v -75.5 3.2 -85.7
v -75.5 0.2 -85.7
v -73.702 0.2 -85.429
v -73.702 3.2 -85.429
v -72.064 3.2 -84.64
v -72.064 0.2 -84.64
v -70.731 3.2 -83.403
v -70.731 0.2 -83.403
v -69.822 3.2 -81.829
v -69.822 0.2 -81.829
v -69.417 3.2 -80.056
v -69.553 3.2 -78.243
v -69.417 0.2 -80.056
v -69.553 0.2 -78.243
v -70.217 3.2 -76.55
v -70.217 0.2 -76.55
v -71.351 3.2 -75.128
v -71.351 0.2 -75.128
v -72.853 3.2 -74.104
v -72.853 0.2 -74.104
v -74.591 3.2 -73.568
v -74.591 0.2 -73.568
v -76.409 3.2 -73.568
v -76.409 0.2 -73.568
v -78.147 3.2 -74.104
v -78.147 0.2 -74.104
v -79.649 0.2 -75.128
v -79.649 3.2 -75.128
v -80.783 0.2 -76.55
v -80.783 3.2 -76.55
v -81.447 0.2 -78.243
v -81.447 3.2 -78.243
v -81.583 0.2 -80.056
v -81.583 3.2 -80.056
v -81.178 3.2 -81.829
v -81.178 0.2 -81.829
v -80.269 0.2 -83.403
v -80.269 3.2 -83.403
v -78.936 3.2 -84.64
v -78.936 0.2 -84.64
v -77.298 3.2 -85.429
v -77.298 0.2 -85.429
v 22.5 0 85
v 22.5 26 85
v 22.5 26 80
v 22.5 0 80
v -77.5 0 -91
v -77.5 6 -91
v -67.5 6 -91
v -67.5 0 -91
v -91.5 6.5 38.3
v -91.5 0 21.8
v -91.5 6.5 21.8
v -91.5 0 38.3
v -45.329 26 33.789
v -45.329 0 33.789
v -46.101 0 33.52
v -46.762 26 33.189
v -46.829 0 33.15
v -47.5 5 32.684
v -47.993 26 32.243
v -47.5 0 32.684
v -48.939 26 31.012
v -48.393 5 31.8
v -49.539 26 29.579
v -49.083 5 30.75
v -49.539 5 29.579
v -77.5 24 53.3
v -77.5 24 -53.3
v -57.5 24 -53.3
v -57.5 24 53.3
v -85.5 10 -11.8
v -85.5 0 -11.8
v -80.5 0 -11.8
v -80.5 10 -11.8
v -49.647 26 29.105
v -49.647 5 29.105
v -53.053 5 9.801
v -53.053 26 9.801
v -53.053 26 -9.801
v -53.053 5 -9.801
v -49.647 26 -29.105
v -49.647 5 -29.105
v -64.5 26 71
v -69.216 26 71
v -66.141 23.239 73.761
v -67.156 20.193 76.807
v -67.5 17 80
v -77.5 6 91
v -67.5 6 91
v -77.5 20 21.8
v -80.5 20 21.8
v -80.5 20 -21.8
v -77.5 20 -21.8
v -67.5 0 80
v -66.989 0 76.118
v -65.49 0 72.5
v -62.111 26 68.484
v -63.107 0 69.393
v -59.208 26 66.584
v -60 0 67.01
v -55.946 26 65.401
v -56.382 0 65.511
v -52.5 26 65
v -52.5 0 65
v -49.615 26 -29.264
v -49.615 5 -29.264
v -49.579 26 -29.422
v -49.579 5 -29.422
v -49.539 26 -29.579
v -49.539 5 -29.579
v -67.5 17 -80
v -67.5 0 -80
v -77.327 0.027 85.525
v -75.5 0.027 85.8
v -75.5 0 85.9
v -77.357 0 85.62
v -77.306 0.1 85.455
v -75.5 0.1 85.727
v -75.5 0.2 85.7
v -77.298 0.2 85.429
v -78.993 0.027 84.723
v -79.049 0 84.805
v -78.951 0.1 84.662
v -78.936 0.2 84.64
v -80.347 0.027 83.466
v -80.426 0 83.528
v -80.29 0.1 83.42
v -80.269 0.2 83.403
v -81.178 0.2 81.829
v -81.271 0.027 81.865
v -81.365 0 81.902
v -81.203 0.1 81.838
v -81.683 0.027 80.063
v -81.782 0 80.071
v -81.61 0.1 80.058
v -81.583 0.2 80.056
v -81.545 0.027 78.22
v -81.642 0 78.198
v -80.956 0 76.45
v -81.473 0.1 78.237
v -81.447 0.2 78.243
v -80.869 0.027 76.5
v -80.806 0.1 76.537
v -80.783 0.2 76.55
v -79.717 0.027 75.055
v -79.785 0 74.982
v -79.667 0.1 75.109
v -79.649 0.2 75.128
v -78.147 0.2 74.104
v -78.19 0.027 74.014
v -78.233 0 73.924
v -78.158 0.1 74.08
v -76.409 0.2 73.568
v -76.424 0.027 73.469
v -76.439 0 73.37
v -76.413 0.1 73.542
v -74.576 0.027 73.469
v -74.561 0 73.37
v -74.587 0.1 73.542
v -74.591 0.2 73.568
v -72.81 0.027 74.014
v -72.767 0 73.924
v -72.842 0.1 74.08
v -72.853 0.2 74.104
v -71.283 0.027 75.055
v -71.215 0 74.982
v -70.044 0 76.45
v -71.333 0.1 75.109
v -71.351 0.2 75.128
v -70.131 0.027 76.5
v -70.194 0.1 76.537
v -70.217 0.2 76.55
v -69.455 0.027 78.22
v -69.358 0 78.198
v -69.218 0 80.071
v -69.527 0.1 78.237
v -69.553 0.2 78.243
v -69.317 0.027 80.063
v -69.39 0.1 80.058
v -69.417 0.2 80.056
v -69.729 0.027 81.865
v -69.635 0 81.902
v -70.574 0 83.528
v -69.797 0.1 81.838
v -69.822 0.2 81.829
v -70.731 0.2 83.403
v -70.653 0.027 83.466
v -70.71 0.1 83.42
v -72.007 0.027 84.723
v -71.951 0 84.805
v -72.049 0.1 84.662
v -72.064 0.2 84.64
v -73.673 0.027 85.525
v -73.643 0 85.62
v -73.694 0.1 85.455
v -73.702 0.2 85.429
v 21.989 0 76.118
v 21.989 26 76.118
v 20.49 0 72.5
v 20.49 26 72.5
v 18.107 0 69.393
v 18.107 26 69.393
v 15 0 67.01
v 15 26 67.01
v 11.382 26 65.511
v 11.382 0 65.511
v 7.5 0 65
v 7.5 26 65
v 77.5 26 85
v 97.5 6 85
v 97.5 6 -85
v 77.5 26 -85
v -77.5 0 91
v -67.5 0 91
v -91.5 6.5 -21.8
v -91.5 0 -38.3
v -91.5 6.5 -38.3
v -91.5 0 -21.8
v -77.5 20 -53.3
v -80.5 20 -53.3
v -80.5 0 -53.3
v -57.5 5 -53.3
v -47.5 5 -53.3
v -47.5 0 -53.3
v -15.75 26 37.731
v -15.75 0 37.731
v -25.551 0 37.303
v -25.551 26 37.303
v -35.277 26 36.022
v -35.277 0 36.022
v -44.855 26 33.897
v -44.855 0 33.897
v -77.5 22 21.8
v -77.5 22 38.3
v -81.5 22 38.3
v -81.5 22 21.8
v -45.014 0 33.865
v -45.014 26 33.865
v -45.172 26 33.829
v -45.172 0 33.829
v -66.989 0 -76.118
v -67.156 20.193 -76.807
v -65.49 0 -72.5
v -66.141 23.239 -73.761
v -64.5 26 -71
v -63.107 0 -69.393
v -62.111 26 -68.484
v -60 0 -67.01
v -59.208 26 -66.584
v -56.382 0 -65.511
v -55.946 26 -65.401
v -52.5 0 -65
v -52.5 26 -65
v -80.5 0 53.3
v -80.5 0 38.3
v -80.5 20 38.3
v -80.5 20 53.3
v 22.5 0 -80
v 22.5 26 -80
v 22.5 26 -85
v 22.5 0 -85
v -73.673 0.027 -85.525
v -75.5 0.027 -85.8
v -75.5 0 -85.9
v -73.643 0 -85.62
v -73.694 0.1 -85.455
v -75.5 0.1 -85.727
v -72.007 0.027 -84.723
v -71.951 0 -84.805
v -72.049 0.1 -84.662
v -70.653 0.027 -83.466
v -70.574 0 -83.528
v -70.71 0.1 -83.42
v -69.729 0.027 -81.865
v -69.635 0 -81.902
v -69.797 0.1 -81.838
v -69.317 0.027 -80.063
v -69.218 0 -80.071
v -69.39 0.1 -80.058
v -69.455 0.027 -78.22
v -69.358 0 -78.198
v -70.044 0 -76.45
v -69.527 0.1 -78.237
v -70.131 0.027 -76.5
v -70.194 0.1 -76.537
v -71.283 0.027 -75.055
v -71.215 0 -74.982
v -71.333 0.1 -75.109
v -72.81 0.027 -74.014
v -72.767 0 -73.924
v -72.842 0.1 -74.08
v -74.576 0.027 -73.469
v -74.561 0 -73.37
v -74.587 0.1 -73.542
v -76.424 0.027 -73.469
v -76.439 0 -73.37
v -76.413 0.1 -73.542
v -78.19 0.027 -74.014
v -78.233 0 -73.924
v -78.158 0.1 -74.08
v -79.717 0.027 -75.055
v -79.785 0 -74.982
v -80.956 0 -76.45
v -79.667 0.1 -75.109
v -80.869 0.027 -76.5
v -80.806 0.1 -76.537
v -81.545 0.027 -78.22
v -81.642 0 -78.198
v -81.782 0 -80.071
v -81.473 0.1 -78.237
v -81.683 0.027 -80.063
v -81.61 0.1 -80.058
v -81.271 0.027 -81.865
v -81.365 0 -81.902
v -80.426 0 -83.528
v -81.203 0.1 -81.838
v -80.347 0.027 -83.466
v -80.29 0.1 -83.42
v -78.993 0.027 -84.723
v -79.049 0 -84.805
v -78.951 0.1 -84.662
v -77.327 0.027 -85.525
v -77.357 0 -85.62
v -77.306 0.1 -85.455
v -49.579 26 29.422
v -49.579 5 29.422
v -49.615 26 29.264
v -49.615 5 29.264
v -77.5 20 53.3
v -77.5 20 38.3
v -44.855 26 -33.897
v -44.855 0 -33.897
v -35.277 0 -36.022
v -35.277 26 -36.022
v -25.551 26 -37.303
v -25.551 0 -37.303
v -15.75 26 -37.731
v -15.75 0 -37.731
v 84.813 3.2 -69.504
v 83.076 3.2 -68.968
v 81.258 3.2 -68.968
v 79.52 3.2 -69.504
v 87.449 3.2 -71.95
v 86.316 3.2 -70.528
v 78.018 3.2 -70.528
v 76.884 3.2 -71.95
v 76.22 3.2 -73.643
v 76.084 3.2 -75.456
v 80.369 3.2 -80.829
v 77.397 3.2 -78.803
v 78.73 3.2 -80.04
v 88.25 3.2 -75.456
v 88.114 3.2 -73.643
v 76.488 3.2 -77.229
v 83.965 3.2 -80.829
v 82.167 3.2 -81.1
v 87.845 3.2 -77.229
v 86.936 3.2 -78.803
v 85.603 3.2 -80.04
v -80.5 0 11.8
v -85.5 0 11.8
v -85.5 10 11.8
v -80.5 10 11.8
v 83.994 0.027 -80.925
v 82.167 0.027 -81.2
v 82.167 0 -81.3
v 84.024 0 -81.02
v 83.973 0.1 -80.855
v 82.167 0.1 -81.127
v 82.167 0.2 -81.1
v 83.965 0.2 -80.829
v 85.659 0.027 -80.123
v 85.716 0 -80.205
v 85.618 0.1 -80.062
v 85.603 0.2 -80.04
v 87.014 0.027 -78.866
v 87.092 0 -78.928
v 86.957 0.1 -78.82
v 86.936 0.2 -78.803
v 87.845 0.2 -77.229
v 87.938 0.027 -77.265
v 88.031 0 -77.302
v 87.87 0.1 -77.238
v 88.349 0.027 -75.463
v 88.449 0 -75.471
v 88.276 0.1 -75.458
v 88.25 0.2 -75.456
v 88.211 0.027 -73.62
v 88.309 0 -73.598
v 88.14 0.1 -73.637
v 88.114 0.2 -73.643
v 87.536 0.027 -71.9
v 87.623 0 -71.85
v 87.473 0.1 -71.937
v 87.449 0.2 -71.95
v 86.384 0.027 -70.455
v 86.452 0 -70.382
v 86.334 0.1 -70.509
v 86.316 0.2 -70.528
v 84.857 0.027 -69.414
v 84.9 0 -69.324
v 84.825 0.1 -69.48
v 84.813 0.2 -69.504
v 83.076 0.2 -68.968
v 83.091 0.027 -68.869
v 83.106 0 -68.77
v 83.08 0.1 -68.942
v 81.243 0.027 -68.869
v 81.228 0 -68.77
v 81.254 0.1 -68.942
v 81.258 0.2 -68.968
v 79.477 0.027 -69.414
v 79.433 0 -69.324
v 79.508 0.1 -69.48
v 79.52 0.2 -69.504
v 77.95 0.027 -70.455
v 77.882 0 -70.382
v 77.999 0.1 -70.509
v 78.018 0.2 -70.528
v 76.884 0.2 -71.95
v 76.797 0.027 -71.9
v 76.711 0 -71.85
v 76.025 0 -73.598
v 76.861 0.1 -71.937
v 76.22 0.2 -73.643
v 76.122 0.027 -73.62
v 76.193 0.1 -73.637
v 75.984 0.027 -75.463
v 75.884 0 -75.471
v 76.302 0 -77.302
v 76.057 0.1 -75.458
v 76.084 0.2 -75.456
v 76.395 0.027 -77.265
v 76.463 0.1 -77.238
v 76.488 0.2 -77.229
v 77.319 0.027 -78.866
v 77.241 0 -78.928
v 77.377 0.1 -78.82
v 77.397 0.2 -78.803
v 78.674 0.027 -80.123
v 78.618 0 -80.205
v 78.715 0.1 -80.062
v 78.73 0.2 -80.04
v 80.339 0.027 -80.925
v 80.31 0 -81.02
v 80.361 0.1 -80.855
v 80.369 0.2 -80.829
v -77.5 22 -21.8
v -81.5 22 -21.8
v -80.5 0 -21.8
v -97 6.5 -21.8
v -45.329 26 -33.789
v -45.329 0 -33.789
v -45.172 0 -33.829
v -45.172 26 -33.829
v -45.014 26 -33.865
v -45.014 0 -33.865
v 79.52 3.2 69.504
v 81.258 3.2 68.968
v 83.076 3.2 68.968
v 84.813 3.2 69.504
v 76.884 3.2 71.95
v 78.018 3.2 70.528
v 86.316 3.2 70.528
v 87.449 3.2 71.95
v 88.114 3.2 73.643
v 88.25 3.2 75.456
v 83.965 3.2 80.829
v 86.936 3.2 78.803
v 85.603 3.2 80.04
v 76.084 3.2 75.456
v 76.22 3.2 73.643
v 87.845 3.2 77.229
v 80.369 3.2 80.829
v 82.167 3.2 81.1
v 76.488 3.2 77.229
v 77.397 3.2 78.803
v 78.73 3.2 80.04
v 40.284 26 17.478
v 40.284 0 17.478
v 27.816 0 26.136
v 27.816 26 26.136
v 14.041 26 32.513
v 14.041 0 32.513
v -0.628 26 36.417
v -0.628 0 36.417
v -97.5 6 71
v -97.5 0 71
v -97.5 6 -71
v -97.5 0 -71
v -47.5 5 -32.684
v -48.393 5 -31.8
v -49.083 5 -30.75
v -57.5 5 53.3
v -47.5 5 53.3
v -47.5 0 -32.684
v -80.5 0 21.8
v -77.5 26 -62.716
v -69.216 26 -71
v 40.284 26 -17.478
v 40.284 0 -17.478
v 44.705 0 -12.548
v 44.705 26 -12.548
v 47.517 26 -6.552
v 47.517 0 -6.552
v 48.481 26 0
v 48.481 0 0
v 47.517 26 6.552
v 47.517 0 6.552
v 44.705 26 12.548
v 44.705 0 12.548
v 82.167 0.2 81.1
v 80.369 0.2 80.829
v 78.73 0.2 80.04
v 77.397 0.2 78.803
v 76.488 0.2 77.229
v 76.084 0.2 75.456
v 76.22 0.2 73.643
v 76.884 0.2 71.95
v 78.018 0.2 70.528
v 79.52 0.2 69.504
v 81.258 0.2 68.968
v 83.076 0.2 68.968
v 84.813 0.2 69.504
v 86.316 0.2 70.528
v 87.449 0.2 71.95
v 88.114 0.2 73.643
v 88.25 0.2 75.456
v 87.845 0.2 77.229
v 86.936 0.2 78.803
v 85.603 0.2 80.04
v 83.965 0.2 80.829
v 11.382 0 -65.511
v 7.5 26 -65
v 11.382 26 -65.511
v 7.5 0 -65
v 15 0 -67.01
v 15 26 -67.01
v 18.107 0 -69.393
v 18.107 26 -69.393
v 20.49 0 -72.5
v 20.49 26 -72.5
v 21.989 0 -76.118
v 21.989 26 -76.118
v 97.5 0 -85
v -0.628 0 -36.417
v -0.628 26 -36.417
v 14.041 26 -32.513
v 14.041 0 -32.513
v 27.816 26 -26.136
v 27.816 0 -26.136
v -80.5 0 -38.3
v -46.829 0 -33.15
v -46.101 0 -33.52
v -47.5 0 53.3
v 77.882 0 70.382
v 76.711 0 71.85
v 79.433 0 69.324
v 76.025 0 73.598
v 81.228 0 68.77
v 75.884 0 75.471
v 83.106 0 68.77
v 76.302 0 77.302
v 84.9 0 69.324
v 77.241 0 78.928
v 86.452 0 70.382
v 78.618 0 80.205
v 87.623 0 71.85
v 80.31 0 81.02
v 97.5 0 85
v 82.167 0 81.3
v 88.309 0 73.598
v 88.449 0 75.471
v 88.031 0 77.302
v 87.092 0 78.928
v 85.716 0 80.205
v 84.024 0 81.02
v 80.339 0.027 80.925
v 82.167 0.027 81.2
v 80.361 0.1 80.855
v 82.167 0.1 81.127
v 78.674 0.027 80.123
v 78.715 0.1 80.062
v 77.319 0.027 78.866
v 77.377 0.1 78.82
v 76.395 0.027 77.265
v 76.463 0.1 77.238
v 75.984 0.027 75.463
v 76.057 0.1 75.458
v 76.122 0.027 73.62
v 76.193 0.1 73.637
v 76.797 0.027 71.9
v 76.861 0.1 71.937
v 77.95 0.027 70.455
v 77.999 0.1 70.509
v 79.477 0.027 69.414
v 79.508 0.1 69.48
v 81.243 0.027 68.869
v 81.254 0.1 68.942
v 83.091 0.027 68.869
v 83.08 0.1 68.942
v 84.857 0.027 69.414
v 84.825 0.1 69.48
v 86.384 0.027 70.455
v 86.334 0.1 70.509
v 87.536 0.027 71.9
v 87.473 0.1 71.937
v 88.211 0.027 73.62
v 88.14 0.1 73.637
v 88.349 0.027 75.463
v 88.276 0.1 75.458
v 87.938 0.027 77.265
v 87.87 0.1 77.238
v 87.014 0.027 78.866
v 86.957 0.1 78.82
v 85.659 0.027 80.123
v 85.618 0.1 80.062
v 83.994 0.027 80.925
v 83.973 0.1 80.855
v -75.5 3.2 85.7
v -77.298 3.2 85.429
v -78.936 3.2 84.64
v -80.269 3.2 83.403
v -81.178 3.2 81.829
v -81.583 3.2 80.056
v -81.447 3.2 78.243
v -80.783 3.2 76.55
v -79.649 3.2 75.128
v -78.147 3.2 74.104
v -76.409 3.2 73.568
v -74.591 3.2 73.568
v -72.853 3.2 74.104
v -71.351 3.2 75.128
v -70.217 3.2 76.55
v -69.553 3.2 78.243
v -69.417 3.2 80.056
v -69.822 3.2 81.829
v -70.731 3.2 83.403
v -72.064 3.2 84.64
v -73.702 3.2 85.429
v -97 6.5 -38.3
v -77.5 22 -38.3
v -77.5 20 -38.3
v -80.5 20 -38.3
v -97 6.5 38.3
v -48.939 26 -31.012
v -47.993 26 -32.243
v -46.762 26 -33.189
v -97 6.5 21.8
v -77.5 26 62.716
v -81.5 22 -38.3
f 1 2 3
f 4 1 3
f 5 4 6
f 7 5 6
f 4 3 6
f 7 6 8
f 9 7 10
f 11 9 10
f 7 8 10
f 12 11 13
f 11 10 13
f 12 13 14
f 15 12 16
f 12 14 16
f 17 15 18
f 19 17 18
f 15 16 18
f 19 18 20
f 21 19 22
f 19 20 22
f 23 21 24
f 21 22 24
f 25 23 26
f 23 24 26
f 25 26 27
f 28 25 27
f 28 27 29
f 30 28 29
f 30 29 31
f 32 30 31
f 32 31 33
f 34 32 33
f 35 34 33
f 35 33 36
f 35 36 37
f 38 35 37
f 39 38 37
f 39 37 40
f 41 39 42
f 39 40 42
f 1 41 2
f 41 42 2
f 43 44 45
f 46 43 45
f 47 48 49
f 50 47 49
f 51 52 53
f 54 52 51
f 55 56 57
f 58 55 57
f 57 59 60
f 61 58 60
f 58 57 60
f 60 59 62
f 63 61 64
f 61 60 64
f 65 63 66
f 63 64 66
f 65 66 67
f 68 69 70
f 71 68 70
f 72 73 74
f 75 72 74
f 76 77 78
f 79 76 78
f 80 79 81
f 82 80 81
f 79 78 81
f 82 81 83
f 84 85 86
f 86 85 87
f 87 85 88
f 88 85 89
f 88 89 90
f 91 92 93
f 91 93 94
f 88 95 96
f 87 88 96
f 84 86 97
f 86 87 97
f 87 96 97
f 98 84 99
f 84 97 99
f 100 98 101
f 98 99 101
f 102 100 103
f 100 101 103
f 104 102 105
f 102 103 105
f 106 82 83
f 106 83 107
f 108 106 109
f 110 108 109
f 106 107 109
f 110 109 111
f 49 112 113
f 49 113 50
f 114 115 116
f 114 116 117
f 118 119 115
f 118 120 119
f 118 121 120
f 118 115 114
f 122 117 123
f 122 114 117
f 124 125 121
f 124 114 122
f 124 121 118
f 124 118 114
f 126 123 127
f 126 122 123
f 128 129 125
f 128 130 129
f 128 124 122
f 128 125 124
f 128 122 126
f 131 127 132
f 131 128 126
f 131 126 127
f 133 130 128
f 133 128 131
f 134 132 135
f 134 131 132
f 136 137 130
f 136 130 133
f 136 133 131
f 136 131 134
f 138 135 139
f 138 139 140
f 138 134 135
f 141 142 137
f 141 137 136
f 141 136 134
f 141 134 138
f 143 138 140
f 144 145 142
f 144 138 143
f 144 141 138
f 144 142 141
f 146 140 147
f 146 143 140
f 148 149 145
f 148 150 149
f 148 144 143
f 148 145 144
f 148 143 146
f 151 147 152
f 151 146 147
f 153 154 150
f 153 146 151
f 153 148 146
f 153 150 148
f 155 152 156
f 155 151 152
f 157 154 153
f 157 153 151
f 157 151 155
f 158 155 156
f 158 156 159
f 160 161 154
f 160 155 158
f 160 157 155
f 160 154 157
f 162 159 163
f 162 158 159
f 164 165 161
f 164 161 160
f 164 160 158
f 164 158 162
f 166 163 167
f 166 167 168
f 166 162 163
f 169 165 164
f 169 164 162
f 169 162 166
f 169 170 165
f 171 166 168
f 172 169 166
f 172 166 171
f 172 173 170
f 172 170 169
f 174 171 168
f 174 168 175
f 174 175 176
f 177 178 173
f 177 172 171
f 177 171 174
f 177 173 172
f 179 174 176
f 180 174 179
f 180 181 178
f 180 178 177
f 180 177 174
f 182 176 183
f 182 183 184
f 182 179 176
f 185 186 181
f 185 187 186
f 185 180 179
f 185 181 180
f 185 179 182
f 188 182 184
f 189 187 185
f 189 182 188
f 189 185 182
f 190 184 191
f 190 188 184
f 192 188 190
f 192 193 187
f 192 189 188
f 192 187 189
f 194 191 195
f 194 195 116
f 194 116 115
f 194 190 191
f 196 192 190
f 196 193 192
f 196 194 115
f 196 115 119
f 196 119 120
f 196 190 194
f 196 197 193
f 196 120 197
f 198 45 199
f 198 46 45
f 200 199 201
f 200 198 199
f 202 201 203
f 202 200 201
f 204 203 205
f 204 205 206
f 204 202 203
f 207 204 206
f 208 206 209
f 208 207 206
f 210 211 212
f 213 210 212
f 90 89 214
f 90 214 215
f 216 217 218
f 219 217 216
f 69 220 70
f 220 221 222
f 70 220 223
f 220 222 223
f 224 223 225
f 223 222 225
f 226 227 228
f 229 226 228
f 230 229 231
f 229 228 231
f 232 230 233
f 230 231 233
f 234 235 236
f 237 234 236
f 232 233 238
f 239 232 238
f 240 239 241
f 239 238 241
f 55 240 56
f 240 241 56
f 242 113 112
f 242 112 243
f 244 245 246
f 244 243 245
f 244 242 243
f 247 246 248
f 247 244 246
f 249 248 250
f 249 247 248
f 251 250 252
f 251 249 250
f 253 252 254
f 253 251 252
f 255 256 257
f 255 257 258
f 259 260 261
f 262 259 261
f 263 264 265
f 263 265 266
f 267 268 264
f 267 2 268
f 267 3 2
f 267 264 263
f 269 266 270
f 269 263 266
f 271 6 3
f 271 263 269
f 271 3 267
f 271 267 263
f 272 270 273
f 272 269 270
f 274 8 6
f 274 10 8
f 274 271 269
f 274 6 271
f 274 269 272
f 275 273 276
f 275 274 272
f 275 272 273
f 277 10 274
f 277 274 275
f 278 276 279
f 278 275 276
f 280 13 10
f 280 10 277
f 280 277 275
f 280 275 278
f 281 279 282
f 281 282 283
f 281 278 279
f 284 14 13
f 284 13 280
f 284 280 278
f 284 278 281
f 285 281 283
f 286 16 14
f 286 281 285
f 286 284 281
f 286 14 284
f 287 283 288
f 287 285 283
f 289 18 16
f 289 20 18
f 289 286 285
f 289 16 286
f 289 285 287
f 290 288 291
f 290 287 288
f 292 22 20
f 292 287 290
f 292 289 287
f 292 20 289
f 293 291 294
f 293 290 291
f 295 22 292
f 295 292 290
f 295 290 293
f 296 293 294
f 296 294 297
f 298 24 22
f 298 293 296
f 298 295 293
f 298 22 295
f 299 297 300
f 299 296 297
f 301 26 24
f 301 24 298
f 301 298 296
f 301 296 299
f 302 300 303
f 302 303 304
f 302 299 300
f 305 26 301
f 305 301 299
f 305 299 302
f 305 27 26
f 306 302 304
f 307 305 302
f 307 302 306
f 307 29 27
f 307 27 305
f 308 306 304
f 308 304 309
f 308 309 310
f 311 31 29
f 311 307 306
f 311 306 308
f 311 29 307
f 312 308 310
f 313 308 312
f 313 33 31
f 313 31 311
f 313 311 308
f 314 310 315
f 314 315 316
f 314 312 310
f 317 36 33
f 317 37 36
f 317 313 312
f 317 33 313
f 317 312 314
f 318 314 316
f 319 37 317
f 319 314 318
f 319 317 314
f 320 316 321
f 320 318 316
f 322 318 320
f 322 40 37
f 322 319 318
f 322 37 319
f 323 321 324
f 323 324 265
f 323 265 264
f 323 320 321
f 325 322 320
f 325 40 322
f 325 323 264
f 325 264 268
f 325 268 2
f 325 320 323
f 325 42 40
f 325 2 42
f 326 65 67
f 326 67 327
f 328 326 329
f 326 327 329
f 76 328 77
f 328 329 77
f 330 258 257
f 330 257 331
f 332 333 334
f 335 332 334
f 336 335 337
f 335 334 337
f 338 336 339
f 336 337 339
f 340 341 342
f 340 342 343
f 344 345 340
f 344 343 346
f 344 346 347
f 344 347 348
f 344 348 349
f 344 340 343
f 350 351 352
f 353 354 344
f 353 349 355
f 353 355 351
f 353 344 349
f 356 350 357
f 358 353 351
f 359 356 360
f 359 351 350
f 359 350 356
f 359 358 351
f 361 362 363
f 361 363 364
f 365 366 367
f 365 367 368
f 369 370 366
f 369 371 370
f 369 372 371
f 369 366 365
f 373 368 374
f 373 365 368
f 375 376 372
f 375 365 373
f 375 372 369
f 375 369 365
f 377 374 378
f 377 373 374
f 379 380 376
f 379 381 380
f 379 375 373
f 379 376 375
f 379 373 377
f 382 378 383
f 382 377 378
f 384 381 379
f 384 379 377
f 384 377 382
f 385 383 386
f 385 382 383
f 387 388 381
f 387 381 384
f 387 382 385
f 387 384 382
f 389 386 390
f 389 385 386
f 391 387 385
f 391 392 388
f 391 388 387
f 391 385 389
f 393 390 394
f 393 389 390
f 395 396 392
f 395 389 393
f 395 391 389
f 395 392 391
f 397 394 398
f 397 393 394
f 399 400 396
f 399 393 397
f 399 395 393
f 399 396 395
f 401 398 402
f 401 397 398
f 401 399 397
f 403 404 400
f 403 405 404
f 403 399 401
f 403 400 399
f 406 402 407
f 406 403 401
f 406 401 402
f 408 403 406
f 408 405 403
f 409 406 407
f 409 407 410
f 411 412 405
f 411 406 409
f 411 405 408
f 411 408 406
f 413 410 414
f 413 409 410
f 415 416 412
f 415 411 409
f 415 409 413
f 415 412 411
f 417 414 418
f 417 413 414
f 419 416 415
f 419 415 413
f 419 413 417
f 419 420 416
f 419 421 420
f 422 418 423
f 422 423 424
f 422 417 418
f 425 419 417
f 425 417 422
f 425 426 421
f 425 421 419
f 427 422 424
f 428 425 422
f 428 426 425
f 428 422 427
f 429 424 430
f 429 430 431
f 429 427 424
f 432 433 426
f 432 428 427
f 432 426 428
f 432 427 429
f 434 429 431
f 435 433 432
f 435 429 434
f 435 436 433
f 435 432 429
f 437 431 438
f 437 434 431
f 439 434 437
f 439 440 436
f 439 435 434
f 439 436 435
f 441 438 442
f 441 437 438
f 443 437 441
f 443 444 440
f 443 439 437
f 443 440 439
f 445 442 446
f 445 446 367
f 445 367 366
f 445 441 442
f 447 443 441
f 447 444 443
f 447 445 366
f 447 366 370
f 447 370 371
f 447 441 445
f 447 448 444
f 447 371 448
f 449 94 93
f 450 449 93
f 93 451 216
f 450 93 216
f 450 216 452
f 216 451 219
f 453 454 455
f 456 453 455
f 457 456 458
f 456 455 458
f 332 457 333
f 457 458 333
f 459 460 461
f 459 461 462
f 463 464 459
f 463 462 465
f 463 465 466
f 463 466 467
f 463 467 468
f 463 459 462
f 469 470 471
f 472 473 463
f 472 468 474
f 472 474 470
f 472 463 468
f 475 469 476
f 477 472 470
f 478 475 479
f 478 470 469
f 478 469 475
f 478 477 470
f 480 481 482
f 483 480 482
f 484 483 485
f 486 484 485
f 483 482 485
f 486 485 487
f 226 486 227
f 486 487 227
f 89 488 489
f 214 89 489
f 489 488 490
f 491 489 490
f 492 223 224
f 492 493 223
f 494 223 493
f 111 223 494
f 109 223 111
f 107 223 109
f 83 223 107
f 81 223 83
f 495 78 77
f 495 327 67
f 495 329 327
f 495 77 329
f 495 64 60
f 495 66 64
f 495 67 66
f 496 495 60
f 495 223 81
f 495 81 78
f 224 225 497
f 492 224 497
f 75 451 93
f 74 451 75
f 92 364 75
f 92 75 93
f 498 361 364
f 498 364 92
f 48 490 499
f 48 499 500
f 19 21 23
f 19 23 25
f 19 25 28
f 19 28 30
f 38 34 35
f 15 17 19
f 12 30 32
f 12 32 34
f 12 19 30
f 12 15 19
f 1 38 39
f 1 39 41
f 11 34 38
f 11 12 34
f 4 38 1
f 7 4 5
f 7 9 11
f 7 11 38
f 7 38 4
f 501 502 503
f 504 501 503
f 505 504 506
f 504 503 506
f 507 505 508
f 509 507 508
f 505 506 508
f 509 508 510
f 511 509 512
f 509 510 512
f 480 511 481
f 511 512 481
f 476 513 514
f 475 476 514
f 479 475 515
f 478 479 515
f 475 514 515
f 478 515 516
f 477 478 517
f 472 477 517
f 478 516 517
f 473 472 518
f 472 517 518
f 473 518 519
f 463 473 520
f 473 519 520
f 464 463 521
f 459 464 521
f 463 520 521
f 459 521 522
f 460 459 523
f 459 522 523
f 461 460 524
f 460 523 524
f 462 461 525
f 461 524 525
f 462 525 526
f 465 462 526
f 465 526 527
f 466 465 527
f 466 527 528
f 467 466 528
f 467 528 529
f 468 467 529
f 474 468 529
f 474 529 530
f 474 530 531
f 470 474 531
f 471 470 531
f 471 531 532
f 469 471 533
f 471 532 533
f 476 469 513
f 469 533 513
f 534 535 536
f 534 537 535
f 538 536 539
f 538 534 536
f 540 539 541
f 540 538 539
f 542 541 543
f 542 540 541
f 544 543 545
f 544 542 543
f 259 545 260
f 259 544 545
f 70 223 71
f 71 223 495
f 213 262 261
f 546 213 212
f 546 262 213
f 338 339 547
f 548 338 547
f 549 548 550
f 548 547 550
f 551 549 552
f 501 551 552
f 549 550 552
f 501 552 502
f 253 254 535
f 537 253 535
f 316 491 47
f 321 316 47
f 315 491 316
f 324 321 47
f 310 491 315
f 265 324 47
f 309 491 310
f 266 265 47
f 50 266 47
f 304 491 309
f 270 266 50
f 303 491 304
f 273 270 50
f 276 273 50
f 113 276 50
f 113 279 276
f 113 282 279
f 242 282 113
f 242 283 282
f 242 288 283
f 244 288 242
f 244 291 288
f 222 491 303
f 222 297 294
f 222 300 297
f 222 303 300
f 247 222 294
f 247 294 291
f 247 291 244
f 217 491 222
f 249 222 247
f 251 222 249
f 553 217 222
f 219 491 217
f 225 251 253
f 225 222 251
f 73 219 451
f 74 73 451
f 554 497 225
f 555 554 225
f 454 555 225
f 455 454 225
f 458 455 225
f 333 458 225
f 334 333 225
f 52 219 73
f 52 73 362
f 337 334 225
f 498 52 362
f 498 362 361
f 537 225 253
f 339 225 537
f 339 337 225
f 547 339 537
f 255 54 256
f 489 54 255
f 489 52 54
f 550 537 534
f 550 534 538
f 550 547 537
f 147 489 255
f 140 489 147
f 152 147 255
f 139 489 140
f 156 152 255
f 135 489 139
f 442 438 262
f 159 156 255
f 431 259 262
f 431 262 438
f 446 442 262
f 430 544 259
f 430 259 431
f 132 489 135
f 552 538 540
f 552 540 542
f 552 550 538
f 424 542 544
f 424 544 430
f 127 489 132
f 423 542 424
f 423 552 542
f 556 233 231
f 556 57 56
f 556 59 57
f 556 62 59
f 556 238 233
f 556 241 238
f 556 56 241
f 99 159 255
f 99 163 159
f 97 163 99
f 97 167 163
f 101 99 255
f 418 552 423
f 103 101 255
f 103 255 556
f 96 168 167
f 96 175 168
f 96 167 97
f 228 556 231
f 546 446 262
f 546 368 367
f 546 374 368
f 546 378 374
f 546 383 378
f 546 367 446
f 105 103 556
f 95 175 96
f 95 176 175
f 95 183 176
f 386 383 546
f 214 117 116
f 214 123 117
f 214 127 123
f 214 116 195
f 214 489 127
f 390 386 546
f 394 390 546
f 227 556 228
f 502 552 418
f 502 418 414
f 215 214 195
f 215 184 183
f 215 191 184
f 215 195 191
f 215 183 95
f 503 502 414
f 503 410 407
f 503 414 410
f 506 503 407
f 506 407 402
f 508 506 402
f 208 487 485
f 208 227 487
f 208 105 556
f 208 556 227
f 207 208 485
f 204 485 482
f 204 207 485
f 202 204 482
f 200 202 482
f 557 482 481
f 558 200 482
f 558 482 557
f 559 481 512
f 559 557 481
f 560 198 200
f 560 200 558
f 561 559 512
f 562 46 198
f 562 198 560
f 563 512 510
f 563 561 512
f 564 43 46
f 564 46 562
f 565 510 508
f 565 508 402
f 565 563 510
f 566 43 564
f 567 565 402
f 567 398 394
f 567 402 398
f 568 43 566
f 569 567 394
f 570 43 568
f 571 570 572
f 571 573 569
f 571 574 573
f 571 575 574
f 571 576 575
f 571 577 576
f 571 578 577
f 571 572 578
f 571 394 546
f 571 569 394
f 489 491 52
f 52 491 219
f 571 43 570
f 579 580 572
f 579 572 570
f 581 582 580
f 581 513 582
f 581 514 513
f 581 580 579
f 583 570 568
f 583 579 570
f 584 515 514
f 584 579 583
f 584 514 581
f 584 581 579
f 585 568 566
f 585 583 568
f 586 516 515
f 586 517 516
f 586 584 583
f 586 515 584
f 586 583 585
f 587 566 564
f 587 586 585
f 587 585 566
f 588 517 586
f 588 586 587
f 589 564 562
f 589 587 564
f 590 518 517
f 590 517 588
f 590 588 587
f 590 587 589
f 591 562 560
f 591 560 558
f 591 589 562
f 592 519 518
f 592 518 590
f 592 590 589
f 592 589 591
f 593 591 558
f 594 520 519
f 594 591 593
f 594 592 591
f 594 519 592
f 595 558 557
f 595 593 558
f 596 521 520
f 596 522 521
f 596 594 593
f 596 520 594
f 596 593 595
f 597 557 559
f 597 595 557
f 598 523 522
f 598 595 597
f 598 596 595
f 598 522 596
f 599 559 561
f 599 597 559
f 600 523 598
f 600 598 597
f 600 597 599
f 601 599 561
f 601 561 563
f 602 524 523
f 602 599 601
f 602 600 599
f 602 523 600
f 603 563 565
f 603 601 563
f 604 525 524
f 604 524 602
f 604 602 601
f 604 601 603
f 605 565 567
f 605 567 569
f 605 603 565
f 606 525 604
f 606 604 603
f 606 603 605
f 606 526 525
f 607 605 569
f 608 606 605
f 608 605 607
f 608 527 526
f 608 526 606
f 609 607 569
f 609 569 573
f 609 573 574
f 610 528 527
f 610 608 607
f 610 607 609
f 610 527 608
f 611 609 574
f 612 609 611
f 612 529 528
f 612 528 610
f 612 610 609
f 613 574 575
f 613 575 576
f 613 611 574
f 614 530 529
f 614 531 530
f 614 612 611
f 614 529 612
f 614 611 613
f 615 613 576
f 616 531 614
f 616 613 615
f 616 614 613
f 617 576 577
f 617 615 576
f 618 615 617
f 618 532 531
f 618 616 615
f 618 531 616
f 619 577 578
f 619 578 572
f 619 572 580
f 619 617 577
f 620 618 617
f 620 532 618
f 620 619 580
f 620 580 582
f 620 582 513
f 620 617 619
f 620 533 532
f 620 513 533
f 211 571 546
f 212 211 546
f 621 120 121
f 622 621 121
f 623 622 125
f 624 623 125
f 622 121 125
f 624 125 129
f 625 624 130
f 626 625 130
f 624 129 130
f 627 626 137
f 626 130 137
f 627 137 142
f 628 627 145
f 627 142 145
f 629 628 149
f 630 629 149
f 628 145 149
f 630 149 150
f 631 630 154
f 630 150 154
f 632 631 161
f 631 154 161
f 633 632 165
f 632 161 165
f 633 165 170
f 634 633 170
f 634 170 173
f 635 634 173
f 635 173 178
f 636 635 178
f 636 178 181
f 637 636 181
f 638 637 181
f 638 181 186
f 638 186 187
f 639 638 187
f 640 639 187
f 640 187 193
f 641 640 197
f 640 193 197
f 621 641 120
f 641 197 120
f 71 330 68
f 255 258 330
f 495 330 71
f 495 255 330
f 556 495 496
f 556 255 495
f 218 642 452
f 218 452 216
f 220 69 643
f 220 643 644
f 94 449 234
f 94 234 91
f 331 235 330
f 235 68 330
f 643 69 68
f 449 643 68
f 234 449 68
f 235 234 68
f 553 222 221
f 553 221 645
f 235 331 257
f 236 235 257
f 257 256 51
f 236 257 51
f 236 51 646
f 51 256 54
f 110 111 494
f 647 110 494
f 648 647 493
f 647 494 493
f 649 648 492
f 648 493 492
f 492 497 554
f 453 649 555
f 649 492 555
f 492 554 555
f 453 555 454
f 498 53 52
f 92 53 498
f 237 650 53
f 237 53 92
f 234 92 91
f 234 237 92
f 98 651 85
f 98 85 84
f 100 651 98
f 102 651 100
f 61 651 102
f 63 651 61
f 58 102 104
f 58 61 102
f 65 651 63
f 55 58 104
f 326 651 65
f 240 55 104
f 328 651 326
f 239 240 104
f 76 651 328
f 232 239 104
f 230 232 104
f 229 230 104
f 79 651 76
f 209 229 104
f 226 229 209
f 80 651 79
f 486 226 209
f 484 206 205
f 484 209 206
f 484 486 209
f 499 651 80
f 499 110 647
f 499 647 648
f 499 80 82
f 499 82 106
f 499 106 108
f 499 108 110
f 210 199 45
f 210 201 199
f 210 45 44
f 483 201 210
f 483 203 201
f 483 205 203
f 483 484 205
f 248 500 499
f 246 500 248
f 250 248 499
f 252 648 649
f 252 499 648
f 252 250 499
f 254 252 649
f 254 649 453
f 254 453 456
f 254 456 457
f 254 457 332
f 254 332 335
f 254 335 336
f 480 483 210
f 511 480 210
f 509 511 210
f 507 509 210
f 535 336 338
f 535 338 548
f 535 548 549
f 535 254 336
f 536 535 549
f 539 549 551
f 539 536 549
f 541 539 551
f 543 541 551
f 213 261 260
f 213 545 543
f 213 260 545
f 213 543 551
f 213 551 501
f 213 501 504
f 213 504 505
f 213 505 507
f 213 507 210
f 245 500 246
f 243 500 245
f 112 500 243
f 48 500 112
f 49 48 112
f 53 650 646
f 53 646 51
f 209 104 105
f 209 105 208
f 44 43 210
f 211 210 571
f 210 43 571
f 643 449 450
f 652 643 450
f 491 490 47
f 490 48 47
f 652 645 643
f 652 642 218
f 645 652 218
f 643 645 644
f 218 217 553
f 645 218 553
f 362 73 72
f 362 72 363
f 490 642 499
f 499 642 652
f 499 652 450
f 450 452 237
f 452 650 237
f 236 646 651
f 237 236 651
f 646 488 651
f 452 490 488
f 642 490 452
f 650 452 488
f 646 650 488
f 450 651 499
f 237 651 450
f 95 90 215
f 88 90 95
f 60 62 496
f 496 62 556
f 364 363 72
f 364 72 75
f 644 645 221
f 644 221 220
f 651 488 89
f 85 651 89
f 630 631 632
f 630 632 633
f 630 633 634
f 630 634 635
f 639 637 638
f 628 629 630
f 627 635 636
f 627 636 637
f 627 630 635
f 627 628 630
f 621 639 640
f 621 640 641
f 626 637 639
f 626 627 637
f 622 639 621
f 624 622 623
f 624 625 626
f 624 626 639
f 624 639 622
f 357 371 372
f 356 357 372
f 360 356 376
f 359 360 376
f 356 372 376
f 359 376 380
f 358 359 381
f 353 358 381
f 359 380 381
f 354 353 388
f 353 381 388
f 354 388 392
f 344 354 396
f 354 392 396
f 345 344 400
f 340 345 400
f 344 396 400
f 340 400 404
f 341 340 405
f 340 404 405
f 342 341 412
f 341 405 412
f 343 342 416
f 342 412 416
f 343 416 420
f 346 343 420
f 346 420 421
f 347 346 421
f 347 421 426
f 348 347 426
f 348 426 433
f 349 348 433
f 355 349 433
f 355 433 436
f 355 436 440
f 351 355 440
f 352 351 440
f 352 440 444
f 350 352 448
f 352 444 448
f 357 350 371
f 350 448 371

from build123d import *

# Parameters (mm, degrees)
SKETCH1_W           = 195
SKETCH1_H           = 170
BOSS_EXTRUDE1_DEPTH = 26
SKETCH2_W           = 90
SKETCH2_H           = 20
CUT_EXTRUDE1_DEPTH  = 132.936537775
FILLET1_R           = 15
SKETCH3_W           = 30
SKETCH3_H           = 6
BOSS_EXTRUDE2_DEPTH = 26
CHAMFER1_SIZE       = 20
CHAMFER2_SIZE       = 20
CHAMFER3_SIZE       = 20
SKETCH6_R           = 6.1
CUT_EXTRUDE4_DEPTH  = 3.2
FILLET2_R           = 0.2
CUT_EXTRUDE3_DEPTH  = 23
CUT_EXTRUDE5_DEPTH  = 136.879542242
SKETCH8_W           = 5
SKETCH8_H           = 76.6
BOSS_EXTRUDE3_DEPTH = 7
SKETCH9_W           = 10
SKETCH9_H           = 106.6
CUT_EXTRUDE6_DEPTH  = 5
SKETCH10_W          = 3
SKETCH10_H          = 106.6
CUT_EXTRUDE7_DEPTH  = 20
BOSS_EXTRUDE8_REACH = 166.014
SKETCH14_W          = 6
SKETCH14_H          = 16.5
CUT_EXTRUDE9_DEPTH  = 0.5
SKETCH15_W          = 5
SKETCH15_H          = 23.6
CUT_EXTRUDE10_DEPTH = 10
SKETCH16_W          = 20
SKETCH16_H          = 106.6
CUT_EXTRUDE11_DEPTH = 1


with BuildPart() as part:
    # Sketch1 → Boss-Extrude1 (new body)
    with BuildSketch(Plane(origin=(0, 0, 0), x_dir=(1, 0, 0), z_dir=(0, 1, 0))):
        Rectangle(SKETCH1_W, SKETCH1_H)
    extrude(amount=BOSS_EXTRUDE1_DEPTH)

    # Sketch2 → Cut-Extrude1 (cut, through all)
    with BuildSketch(Plane(origin=(0, 26, 0), x_dir=(1, 0, 0), z_dir=(0, 1, 0))):
        with Locations((-22.5, -75)):
            Rectangle(SKETCH2_W, SKETCH2_H)
        with Locations((-22.5, 75)):
            Rectangle(SKETCH2_W, SKETCH2_H)
    extrude(amount=-CUT_EXTRUDE1_DEPTH, mode=Mode.SUBTRACT)

    # Fillet1
    fillet1_edges = [part.edges().sort_by_distance(p)[0] for p in [
        (-67.5, 13, 65),
        (22.5, 13, 65),
        (-67.5, 13, -65),
        (22.5, 13, -65),
    ]]
    fillet(fillet1_edges, radius=FILLET1_R)

    # Sketch3 → Boss-Extrude2 (add)
    with BuildSketch(Plane(origin=(0, 26, 0), x_dir=(1, 0, 0), z_dir=(0, 1, 0))):
        with Locations((-82.5, 88)):
            Rectangle(SKETCH3_W, SKETCH3_H)
        with Locations((-82.5, -88)):
            Rectangle(SKETCH3_W, SKETCH3_H)
    extrude(amount=-BOSS_EXTRUDE2_DEPTH)

    # Chamfer1
    chamfer1_edges = [part.edges().sort_by_distance(p)[0] for p in [
        (-97.5, 13, -91),
        (-97.5, 13, 91),
    ]]
    chamfer(chamfer1_edges, length=CHAMFER1_SIZE)

    # Chamfer2
    chamfer2_edges = [part.edges().sort_by_distance(p)[0] for p in [
        (-72.5, 26, 91),
        (-72.5, 26, -91),
        (-97.5, 26, 0),
        (-87.5, 26, 81),
        (-87.5, 26, -81),
    ]]
    chamfer(chamfer2_edges, length=CHAMFER2_SIZE)

    # Chamfer3
    chamfer3_edges = [part.edges().sort_by_distance(p)[0] for p in [
        (97.5, 26, 0),
    ]]
    chamfer(chamfer3_edges, length=CHAMFER3_SIZE)

    # Sketch6 → Cut-Extrude4 (cut)
    with BuildSketch(Plane.XZ):
        with Locations(Location((82.166666667, -75, 0), (0, 0, 270))):
            Circle(SKETCH6_R)
        with Locations(Location((82.166666667, 75, 0), (0, 0, 90))):
            Circle(SKETCH6_R)
        with Locations(Location((-75.5, -79.6, 0), (0, 0, 270))):
            Circle(SKETCH6_R)
        with Locations(Location((-75.5, 79.6, 0), (0, 0, 90))):
            Circle(SKETCH6_R)
    extrude(amount=-CUT_EXTRUDE4_DEPTH, mode=Mode.SUBTRACT)

    # Fillet2
    fillet2_edges = [part.edges().sort_by_distance(p)[0] for p in [
        (82.166666667, 0, 68.9),
        (-75.5, 0, -73.5),
        (-75.5, 0, 73.5),
        (82.166666667, 0, -68.9),
    ]]
    fillet(fillet2_edges, radius=FILLET2_R)

    # Sketch5 → Cut-Extrude3 (cut)
    with BuildSketch(Plane.XZ):
        Polygon((-93.5, 38.3), (-77.5, 38.3), (-77.5, 53.3), (-57.5, 53.3), (-57.5, 38.3), (-57.5, -38.3), (-57.5, -53.3), (-77.5, -53.3), (-77.5, -38.3), (-93.5, -38.3), (-96.5, -38.3), (-96.5, -21.8), (-93.5, -21.8), (-77.5, -21.8), (-77.5, 21.8), (-93.5, 21.8), (-96.5, 21.8), (-96.5, 38.3), align=None)
    extrude(amount=-CUT_EXTRUDE3_DEPTH, mode=Mode.SUBTRACT)

    # Sketch7 → Cut-Extrude5 (cut, through all)
    with BuildSketch(Plane.XZ):
        with BuildLine():
            ThreePointArc((-45.328823714, -33.788550396), (-45.093019824, -33.847760063), (-44.855010797, -33.897368154))
            ThreePointArc((-44.855010797, -33.897368154), (-30.428224571, -36.76873565), (-15.749999998, -37.731354711))
            ThreePointArc((-15.749999998, -37.731354711), (14.040735516, -32.512701591), (40.283591791, -17.478249245))
            ThreePointArc((40.283591791, -17.478249245), (48.481354711, 0), (40.283591791, 17.478249245))
            ThreePointArc((40.283591791, 17.478249245), (14.040735515, 32.512701591), (-15.75, 37.731354711))
            ThreePointArc((-15.75, 37.731354711), (-30.428224573, 36.76873565), (-44.855010797, 33.897368153))
            ThreePointArc((-44.855010797, 33.897368153), (-45.093019823, 33.847760063), (-45.328823714, 33.788550395))
            ThreePointArc((-45.328823714, 33.788550395), (-47.992640687, 32.242640687), (-49.538550395, 29.578823714))
            ThreePointArc((-49.538550395, 29.578823714), (-49.597760063, 29.343019823), (-49.647368153, 29.105010797))
            ThreePointArc((-49.647368153, 29.105010797), (-53.481354711, 0), (-49.647368154, -29.105010797))
            ThreePointArc((-49.647368154, -29.105010797), (-49.597760063, -29.343019824), (-49.538550396, -29.578823714))
            ThreePointArc((-49.538550396, -29.578823714), (-47.992640687, -32.242640687), (-45.328823714, -33.788550396))
        make_face()
    extrude(amount=-CUT_EXTRUDE5_DEPTH, mode=Mode.SUBTRACT)

    # Sketch8 → Boss-Extrude3 (add)
    with BuildSketch(Plane.XZ):
        with Locations((-94, 0)):
            Rectangle(SKETCH8_W, SKETCH8_H)
    extrude(amount=-BOSS_EXTRUDE3_DEPTH)

    # Sketch9 → Cut-Extrude6 (cut)
    with BuildSketch(Plane.XZ):
        with Locations((-52.5, 0)):
            Rectangle(SKETCH9_W, SKETCH9_H)
    extrude(amount=-CUT_EXTRUDE6_DEPTH, mode=Mode.SUBTRACT)

    # Sketch10 → Cut-Extrude7 (cut)
    with BuildSketch(Plane.XZ):
        with Locations((-79, 0)):
            Rectangle(SKETCH10_W, SKETCH10_H)
    extrude(amount=-CUT_EXTRUDE7_DEPTH, mode=Mode.SUBTRACT)

    # Boss-Extrude8: up to this face of the body (flat: up to its plane)
    boss_extrude8_end = Plane(part.part.faces().sort_by_distance((-85.605919003, 9.540498442, -38.3))[0])
    # Sketch13 → Boss-Extrude8 (add, up to the picked face)
    with BuildSketch(Plane(origin=(0, 0, 38.3), x_dir=(-1, 0, 0), z_dir=(0, 0, -1)), mode=Mode.PRIVATE) as boss_extrude8_sk1:
        Polygon((80.5, 23), (77.5, 23), (77.5, 22), (81.5, 22), align=None)
    boss_extrude8_tool1 = split(extrude(boss_extrude8_sk1.sketch, amount=BOSS_EXTRUDE8_REACH, mode=Mode.PRIVATE), bisect_by=boss_extrude8_end, keep=Keep.BOTH, mode=Mode.PRIVATE)
    add(boss_extrude8_tool1.solids().sort_by(Axis((-79.261905, 22.47619, 38.3), (0, 0, -1)))[0])

    # Sketch14 → Cut-Extrude9 (cut)
    with BuildSketch(Plane(origin=(0, 7, 0), x_dir=(1, 0, 0), z_dir=(0, 1, 0))):
        with Locations((-94.5, 30.05)):
            Rectangle(SKETCH14_W, SKETCH14_H)
        with Locations((-94.5, -30.05)):
            Rectangle(SKETCH14_W, SKETCH14_H)
    extrude(amount=-CUT_EXTRUDE9_DEPTH, mode=Mode.SUBTRACT)

    # Sketch15 → Cut-Extrude10 (cut)
    with BuildSketch(Plane.XZ):
        with Locations((-83, 0)):
            Rectangle(SKETCH15_W, SKETCH15_H)
    extrude(amount=-CUT_EXTRUDE10_DEPTH, mode=Mode.SUBTRACT)

    # Sketch16 → Cut-Extrude11 (cut)
    with BuildSketch(Plane.XZ.offset(-23)):
        with Locations((-67.5, 0)):
            Rectangle(SKETCH16_W, SKETCH16_H)
    extrude(amount=-CUT_EXTRUDE11_DEPTH, mode=Mode.SUBTRACT)


solid = part.part
